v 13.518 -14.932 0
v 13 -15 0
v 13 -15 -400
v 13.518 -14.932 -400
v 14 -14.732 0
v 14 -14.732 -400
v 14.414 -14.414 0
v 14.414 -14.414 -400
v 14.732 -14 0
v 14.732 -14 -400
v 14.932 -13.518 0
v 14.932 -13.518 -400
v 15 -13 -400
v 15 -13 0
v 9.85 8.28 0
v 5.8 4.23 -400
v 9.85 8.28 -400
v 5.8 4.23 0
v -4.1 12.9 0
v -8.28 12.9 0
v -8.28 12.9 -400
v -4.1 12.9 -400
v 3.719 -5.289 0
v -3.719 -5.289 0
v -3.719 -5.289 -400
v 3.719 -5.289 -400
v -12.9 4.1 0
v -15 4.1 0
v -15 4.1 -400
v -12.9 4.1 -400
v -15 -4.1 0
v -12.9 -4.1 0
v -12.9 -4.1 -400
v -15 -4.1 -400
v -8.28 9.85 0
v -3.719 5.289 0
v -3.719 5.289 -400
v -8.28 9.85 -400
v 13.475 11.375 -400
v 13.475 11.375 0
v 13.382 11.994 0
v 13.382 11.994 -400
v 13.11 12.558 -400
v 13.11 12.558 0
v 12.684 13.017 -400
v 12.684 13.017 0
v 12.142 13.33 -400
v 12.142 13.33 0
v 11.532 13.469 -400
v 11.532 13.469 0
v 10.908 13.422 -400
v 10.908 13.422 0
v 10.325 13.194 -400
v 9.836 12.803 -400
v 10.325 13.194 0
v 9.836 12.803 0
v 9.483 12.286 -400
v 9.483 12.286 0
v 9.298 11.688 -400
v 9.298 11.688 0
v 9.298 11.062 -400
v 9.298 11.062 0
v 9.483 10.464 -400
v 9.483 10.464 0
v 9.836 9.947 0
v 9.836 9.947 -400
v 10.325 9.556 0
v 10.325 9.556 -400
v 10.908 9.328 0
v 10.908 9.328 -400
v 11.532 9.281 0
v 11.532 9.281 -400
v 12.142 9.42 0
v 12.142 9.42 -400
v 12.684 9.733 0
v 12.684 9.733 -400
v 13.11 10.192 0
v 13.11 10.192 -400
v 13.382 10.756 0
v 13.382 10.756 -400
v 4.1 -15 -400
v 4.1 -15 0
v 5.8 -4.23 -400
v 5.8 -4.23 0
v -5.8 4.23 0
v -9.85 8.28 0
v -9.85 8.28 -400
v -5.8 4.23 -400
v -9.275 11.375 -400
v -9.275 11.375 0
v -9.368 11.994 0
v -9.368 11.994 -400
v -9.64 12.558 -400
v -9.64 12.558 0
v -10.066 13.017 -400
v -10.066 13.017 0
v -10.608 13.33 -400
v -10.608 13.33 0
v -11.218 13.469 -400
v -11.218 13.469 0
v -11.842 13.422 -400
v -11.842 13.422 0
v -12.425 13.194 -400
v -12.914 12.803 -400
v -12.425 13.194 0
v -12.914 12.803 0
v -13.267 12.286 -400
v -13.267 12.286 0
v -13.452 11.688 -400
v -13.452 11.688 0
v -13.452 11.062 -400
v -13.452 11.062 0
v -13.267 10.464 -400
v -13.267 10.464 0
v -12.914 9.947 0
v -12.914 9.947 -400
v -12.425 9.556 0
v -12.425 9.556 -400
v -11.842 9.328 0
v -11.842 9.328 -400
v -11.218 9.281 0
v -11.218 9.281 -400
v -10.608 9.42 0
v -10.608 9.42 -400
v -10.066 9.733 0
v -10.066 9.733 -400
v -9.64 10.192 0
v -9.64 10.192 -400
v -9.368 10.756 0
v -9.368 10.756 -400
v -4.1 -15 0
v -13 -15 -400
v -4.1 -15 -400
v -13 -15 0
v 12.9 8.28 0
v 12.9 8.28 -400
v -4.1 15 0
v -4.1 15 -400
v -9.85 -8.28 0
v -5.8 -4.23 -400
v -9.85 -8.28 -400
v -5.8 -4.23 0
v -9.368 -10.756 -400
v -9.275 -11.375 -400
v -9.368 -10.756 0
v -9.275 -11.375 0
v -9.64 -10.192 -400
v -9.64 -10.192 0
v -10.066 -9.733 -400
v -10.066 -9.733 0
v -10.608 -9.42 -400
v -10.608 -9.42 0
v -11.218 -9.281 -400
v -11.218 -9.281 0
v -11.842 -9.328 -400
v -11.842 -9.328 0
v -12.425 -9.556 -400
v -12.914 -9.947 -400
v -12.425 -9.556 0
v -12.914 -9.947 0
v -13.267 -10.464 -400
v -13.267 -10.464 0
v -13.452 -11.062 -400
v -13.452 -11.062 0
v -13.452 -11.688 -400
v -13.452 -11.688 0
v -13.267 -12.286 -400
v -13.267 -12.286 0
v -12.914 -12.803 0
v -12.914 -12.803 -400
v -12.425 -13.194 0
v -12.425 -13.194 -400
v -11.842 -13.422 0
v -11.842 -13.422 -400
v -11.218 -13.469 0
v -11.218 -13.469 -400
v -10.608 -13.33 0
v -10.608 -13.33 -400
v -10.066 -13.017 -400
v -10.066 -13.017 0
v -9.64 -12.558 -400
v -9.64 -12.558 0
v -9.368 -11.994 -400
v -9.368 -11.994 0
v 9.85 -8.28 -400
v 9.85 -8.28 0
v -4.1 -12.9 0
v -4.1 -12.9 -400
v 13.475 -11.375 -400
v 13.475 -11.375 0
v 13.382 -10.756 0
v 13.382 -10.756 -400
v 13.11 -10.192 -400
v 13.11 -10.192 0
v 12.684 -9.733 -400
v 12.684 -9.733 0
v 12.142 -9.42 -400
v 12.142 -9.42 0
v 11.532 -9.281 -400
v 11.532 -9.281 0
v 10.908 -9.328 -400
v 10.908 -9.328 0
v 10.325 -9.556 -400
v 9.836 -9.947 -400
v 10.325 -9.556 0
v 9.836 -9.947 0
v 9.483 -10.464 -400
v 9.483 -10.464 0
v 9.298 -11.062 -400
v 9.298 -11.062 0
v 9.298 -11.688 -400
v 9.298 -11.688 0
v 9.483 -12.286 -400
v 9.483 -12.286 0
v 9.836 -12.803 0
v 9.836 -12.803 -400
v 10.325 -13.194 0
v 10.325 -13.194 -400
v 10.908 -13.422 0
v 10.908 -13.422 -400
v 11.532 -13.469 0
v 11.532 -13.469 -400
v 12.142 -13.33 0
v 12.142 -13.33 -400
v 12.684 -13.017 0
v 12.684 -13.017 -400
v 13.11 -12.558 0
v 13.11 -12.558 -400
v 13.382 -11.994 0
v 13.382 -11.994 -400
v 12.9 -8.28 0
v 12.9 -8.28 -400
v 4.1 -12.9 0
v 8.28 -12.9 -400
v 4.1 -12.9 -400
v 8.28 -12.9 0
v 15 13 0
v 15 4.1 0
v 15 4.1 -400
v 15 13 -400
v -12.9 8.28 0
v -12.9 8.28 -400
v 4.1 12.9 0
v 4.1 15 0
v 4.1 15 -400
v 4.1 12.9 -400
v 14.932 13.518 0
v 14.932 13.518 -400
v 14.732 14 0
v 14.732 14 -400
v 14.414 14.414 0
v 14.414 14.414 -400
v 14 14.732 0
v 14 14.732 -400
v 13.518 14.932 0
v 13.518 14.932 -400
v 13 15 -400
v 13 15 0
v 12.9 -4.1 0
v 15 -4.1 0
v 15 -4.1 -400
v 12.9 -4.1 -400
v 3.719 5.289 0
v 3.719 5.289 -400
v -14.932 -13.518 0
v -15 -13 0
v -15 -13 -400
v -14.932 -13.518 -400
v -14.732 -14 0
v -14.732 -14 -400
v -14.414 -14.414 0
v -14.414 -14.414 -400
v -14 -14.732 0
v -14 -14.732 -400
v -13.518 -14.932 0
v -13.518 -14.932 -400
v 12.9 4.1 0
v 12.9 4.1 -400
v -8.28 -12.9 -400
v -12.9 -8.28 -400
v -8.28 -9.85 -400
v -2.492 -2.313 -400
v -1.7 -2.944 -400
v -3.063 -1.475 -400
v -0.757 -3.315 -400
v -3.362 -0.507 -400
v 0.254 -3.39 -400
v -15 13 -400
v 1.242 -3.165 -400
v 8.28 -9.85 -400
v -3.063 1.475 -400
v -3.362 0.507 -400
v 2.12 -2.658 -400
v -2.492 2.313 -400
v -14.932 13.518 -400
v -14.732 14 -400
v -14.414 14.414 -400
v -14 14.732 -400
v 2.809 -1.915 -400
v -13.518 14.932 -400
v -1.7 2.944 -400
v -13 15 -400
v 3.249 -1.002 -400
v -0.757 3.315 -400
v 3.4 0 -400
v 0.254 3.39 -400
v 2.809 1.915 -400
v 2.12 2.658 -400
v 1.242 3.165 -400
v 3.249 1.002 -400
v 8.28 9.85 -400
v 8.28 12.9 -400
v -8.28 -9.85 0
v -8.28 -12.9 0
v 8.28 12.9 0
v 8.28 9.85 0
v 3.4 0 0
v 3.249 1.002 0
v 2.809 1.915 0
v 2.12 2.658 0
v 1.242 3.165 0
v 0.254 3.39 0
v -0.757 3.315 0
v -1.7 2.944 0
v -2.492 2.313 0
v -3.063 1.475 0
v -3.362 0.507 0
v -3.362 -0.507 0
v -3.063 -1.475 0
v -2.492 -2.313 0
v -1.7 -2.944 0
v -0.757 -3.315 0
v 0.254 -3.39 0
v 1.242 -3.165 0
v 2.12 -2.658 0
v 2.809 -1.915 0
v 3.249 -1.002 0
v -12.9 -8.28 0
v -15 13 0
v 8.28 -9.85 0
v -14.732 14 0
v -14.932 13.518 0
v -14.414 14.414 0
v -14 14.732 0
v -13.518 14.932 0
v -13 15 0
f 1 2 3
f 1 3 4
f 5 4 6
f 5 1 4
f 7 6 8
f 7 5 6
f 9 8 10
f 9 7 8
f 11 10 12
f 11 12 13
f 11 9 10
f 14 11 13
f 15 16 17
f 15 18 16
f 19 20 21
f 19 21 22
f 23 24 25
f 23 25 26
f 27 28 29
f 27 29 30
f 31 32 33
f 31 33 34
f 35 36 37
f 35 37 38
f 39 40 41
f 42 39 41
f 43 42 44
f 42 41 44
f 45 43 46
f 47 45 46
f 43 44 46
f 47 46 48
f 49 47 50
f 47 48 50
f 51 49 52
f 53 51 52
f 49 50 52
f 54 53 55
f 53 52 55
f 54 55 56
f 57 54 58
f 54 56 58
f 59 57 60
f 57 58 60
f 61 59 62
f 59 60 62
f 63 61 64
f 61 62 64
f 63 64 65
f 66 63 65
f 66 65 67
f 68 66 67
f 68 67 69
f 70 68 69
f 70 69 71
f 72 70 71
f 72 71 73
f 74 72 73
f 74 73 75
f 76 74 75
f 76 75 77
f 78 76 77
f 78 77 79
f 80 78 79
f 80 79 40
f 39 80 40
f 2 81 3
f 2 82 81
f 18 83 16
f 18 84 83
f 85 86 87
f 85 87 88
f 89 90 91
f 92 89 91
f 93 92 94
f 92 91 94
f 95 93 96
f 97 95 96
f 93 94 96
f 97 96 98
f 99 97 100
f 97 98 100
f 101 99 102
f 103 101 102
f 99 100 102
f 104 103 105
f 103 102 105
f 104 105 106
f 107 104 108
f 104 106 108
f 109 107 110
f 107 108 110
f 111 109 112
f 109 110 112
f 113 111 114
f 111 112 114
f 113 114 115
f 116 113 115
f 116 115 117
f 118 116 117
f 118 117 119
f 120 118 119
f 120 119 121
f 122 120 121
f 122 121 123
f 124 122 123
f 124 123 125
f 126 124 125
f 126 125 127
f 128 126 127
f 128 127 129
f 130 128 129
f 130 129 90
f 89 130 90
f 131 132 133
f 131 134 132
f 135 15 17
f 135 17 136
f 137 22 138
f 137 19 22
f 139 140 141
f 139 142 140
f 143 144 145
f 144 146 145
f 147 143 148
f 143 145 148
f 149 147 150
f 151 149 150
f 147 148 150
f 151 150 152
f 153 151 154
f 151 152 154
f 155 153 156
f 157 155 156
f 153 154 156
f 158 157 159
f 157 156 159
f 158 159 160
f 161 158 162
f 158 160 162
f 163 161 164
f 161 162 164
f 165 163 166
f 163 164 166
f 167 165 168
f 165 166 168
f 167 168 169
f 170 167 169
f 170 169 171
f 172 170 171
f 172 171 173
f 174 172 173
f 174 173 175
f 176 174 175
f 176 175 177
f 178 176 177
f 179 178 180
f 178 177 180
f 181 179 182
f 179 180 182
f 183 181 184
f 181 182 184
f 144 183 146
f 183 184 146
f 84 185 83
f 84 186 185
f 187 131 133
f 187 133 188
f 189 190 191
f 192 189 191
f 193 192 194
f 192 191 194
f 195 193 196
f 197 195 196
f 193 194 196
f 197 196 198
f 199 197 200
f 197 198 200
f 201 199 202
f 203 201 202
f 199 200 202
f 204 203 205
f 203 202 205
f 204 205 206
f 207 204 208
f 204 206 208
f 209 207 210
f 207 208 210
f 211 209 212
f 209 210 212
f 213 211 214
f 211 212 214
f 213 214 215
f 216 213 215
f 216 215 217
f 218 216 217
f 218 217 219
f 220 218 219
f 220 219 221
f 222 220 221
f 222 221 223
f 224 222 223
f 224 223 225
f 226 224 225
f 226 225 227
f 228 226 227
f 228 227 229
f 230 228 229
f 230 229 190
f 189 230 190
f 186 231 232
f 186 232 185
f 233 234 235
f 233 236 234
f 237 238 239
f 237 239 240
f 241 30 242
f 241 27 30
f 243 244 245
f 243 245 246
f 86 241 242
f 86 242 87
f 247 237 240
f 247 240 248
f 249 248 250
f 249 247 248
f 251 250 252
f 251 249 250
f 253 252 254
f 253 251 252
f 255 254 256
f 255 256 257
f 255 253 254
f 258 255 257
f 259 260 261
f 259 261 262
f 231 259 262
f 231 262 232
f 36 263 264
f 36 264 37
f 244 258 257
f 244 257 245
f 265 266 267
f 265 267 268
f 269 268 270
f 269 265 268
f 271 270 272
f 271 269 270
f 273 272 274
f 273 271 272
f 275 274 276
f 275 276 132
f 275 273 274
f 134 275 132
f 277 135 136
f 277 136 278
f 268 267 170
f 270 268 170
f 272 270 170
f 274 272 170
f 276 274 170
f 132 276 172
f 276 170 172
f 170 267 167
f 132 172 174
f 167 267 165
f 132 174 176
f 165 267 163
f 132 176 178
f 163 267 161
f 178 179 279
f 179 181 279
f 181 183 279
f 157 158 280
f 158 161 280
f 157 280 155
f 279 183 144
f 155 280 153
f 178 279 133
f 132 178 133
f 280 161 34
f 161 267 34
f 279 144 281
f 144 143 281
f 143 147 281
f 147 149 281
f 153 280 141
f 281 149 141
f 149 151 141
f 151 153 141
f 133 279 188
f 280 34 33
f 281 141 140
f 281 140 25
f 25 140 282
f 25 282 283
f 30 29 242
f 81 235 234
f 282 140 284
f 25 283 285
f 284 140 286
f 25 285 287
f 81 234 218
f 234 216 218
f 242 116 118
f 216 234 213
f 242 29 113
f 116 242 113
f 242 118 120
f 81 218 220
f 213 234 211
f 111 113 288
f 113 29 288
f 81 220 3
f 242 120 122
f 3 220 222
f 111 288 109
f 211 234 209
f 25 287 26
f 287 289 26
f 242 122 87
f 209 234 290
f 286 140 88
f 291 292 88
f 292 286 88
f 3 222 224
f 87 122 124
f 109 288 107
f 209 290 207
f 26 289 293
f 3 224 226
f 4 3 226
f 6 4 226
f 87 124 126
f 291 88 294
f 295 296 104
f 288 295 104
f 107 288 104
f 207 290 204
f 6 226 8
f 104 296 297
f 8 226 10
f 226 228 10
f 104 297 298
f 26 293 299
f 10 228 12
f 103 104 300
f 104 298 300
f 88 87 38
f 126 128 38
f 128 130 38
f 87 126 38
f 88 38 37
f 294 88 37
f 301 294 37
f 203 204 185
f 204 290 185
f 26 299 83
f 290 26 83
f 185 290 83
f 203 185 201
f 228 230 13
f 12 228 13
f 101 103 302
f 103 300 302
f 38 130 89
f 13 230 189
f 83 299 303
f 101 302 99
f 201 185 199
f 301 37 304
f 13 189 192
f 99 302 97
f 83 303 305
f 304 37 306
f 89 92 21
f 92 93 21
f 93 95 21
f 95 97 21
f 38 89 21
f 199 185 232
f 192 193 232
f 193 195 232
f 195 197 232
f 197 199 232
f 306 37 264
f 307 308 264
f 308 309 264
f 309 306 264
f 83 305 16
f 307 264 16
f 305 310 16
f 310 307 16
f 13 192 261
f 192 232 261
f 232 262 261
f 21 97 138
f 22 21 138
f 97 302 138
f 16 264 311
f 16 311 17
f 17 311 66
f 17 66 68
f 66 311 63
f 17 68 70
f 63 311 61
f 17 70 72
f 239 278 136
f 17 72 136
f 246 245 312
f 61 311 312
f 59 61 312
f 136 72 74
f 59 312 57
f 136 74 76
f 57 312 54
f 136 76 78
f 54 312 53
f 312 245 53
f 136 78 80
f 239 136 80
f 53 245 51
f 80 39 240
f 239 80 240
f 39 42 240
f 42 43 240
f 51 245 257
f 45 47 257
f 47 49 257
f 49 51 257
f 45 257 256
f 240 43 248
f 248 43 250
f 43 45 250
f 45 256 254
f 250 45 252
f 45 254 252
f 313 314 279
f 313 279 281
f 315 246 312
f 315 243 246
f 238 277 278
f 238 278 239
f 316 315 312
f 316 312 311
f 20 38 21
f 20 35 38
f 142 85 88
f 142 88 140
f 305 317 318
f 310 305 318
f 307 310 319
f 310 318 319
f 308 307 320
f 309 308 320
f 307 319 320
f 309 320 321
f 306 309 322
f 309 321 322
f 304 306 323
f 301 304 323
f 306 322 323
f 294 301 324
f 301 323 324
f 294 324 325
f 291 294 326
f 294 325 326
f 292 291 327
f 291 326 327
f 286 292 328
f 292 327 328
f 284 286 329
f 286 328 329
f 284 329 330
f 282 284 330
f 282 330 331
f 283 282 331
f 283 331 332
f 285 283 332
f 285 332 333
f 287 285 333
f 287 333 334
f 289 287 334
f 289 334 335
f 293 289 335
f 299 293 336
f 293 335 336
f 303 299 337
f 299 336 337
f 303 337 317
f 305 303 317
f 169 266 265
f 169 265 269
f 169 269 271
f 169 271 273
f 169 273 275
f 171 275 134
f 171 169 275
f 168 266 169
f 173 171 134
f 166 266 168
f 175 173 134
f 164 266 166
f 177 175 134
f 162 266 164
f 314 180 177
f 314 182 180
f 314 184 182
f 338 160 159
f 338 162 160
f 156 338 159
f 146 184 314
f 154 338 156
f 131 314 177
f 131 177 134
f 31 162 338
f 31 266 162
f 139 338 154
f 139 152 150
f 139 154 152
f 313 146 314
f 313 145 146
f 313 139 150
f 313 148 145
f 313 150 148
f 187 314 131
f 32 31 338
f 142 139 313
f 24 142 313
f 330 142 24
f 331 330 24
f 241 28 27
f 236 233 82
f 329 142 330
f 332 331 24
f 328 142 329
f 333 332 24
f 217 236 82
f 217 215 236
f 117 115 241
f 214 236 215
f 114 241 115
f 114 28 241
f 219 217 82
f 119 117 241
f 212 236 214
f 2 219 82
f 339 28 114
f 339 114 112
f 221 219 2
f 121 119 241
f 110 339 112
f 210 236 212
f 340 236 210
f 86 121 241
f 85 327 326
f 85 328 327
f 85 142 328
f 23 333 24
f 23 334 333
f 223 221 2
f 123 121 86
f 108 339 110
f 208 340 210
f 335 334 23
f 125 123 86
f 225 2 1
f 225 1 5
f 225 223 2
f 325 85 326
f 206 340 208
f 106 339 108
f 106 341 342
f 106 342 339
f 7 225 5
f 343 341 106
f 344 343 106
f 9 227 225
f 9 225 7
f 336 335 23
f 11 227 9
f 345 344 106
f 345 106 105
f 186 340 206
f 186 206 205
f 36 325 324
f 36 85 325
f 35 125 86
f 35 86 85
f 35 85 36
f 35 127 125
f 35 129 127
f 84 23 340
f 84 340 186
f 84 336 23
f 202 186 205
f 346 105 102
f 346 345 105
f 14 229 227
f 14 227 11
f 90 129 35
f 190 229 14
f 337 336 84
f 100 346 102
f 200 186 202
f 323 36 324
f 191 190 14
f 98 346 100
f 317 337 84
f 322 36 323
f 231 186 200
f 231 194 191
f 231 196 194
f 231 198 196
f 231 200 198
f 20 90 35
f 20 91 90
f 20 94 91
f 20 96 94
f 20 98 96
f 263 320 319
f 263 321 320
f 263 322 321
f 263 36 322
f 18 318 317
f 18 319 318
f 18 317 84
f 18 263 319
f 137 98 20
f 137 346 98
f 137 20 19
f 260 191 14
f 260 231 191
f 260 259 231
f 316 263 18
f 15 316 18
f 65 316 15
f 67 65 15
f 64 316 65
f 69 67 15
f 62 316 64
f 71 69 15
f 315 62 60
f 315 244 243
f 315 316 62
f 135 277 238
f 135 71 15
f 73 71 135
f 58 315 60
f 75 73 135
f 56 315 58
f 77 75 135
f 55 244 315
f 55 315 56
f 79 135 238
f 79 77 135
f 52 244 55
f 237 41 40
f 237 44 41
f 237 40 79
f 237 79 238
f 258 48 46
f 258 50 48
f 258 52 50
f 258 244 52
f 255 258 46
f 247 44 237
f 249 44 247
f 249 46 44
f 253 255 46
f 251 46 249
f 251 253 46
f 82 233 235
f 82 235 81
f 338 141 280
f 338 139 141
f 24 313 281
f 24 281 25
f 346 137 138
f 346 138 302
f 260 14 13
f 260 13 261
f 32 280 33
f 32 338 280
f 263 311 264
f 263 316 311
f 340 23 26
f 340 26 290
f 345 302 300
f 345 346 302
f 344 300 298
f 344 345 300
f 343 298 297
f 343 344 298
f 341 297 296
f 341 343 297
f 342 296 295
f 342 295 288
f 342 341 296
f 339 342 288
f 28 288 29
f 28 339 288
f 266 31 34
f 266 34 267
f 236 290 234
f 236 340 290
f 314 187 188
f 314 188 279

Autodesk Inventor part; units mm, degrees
ref_plane "YZ Plane" through (0, 0, 0) normal (1, 0, 0) x (0, 1, 0)
ref_plane "XZ Plane" through (0, 0, 0) normal (0, 1, 0) x (-1, 0, 0)
ref_plane "XY Plane" through (0, 0, 0) normal (0, 0, 1) x (1, 0, 0)
sketch "Sketch1" plane through (0, 0, 0) normal (0, 0, 1) x (1, 0, 0)
  circle A0 centre (-11.375, 11.375) radius 2.1
  circle A1 centre (-11.375, -11.375) radius 2.1
  line L0 (-15, 4.1) -> (-12.9, 4.1)
  line L1 (-12.9, 4.1) -> (-12.9, 8.28)
  line L2 (-12.9, 8.28) -> (-9.85, 8.28)
  line L3 (-9.85, 8.28) -> (-5.8, 4.23)
  line L4 (-5.8, 4.23) -> (-5.8, -4.23)
  line L5 (-5.8, -4.23) -> (-9.85, -8.28)
  line L6 (-9.85, -8.28) -> (-12.9, -8.28)
  line L7 (-12.9, -8.28) -> (-12.9, -4.1)
  line L8 (-12.9, -4.1) -> (-15, -4.1)
  line L9 (-15, -4.1) -> (-15, -13)
  arc A2 (-15, -13) -> (-13, -15) centre (-13, -13) ccw
  line L10 (-13, -15) -> (-4.1, -15)
  line L11 (-4.1, -15) -> (-4.1, -12.9)
  line L12 (-4.1, -12.9) -> (-8.28, -12.9)
  line L13 (-8.28, -12.9) -> (-8.28, -9.85)
  line L14 (-8.28, -9.85) -> (-3.719, -5.289)
  line L15 (-3.719, -5.289) -> (3.719, -5.289)
  line L16 (3.719, -5.289) -> (8.28, -9.85)
  line L17 (8.28, -9.85) -> (8.28, -12.9)
  line L18 (8.28, -12.9) -> (4.1, -12.9)
  line L19 (4.1, -12.9) -> (4.1, -15)
  line L20 (4.1, -15) -> (13, -15)
  arc A3 (13, -15) -> (15, -13) centre (13, -13) ccw
  line L21 (15, -13) -> (15, -4.1)
  line L22 (15, -4.1) -> (12.9, -4.1)
  line L23 (12.9, -4.1) -> (12.9, -8.28)
  line L24 (12.9, -8.28) -> (9.85, -8.28)
  line L25 (9.85, -8.28) -> (5.8, -4.23)
  line L26 (5.8, -4.23) -> (5.8, 4.23)
  line L27 (5.8, 4.23) -> (9.85, 8.28)
  line L28 (9.85, 8.28) -> (12.9, 8.28)
  line L29 (12.9, 8.28) -> (12.9, 4.1)
  line L30 (12.9, 4.1) -> (15, 4.1)
  line L31 (15, 4.1) -> (15, 13)
  arc A4 (15, 13) -> (13, 15) centre (13, 13) ccw
  line L32 (13, 15) -> (4.1, 15)
  line L33 (4.1, 15) -> (4.1, 12.9)
  line L34 (4.1, 12.9) -> (8.28, 12.9)
  line L35 (8.28, 12.9) -> (8.28, 9.85)
  line L36 (8.28, 9.85) -> (3.719, 5.289)
  line L37 (3.719, 5.289) -> (-3.719, 5.289)
  line L38 (-3.719, 5.289) -> (-8.28, 9.85)
  line L39 (-8.28, 9.85) -> (-8.28, 12.9)
  line L40 (-8.28, 12.9) -> (-4.1, 12.9)
  line L41 (-4.1, 12.9) -> (-4.1, 15)
  line L42 (-4.1, 15) -> (-13, 15)
  arc A5 (-13, 15) -> (-15, 13) centre (-13, 13) ccw
  line L43 (-15, 13) -> (-15, 4.1)
  circle A6 centre (0, 0) radius 3.4
  circle A7 centre (11.375, 11.375) radius 2.1
  circle A8 centre (11.375, -11.375) radius 2.1
extrude "Extrusion1" add sketch "Sketch1" against normal blind 400
properties part number "Metal Profile 40 cm" material "Aluminum 6061-AHC"
